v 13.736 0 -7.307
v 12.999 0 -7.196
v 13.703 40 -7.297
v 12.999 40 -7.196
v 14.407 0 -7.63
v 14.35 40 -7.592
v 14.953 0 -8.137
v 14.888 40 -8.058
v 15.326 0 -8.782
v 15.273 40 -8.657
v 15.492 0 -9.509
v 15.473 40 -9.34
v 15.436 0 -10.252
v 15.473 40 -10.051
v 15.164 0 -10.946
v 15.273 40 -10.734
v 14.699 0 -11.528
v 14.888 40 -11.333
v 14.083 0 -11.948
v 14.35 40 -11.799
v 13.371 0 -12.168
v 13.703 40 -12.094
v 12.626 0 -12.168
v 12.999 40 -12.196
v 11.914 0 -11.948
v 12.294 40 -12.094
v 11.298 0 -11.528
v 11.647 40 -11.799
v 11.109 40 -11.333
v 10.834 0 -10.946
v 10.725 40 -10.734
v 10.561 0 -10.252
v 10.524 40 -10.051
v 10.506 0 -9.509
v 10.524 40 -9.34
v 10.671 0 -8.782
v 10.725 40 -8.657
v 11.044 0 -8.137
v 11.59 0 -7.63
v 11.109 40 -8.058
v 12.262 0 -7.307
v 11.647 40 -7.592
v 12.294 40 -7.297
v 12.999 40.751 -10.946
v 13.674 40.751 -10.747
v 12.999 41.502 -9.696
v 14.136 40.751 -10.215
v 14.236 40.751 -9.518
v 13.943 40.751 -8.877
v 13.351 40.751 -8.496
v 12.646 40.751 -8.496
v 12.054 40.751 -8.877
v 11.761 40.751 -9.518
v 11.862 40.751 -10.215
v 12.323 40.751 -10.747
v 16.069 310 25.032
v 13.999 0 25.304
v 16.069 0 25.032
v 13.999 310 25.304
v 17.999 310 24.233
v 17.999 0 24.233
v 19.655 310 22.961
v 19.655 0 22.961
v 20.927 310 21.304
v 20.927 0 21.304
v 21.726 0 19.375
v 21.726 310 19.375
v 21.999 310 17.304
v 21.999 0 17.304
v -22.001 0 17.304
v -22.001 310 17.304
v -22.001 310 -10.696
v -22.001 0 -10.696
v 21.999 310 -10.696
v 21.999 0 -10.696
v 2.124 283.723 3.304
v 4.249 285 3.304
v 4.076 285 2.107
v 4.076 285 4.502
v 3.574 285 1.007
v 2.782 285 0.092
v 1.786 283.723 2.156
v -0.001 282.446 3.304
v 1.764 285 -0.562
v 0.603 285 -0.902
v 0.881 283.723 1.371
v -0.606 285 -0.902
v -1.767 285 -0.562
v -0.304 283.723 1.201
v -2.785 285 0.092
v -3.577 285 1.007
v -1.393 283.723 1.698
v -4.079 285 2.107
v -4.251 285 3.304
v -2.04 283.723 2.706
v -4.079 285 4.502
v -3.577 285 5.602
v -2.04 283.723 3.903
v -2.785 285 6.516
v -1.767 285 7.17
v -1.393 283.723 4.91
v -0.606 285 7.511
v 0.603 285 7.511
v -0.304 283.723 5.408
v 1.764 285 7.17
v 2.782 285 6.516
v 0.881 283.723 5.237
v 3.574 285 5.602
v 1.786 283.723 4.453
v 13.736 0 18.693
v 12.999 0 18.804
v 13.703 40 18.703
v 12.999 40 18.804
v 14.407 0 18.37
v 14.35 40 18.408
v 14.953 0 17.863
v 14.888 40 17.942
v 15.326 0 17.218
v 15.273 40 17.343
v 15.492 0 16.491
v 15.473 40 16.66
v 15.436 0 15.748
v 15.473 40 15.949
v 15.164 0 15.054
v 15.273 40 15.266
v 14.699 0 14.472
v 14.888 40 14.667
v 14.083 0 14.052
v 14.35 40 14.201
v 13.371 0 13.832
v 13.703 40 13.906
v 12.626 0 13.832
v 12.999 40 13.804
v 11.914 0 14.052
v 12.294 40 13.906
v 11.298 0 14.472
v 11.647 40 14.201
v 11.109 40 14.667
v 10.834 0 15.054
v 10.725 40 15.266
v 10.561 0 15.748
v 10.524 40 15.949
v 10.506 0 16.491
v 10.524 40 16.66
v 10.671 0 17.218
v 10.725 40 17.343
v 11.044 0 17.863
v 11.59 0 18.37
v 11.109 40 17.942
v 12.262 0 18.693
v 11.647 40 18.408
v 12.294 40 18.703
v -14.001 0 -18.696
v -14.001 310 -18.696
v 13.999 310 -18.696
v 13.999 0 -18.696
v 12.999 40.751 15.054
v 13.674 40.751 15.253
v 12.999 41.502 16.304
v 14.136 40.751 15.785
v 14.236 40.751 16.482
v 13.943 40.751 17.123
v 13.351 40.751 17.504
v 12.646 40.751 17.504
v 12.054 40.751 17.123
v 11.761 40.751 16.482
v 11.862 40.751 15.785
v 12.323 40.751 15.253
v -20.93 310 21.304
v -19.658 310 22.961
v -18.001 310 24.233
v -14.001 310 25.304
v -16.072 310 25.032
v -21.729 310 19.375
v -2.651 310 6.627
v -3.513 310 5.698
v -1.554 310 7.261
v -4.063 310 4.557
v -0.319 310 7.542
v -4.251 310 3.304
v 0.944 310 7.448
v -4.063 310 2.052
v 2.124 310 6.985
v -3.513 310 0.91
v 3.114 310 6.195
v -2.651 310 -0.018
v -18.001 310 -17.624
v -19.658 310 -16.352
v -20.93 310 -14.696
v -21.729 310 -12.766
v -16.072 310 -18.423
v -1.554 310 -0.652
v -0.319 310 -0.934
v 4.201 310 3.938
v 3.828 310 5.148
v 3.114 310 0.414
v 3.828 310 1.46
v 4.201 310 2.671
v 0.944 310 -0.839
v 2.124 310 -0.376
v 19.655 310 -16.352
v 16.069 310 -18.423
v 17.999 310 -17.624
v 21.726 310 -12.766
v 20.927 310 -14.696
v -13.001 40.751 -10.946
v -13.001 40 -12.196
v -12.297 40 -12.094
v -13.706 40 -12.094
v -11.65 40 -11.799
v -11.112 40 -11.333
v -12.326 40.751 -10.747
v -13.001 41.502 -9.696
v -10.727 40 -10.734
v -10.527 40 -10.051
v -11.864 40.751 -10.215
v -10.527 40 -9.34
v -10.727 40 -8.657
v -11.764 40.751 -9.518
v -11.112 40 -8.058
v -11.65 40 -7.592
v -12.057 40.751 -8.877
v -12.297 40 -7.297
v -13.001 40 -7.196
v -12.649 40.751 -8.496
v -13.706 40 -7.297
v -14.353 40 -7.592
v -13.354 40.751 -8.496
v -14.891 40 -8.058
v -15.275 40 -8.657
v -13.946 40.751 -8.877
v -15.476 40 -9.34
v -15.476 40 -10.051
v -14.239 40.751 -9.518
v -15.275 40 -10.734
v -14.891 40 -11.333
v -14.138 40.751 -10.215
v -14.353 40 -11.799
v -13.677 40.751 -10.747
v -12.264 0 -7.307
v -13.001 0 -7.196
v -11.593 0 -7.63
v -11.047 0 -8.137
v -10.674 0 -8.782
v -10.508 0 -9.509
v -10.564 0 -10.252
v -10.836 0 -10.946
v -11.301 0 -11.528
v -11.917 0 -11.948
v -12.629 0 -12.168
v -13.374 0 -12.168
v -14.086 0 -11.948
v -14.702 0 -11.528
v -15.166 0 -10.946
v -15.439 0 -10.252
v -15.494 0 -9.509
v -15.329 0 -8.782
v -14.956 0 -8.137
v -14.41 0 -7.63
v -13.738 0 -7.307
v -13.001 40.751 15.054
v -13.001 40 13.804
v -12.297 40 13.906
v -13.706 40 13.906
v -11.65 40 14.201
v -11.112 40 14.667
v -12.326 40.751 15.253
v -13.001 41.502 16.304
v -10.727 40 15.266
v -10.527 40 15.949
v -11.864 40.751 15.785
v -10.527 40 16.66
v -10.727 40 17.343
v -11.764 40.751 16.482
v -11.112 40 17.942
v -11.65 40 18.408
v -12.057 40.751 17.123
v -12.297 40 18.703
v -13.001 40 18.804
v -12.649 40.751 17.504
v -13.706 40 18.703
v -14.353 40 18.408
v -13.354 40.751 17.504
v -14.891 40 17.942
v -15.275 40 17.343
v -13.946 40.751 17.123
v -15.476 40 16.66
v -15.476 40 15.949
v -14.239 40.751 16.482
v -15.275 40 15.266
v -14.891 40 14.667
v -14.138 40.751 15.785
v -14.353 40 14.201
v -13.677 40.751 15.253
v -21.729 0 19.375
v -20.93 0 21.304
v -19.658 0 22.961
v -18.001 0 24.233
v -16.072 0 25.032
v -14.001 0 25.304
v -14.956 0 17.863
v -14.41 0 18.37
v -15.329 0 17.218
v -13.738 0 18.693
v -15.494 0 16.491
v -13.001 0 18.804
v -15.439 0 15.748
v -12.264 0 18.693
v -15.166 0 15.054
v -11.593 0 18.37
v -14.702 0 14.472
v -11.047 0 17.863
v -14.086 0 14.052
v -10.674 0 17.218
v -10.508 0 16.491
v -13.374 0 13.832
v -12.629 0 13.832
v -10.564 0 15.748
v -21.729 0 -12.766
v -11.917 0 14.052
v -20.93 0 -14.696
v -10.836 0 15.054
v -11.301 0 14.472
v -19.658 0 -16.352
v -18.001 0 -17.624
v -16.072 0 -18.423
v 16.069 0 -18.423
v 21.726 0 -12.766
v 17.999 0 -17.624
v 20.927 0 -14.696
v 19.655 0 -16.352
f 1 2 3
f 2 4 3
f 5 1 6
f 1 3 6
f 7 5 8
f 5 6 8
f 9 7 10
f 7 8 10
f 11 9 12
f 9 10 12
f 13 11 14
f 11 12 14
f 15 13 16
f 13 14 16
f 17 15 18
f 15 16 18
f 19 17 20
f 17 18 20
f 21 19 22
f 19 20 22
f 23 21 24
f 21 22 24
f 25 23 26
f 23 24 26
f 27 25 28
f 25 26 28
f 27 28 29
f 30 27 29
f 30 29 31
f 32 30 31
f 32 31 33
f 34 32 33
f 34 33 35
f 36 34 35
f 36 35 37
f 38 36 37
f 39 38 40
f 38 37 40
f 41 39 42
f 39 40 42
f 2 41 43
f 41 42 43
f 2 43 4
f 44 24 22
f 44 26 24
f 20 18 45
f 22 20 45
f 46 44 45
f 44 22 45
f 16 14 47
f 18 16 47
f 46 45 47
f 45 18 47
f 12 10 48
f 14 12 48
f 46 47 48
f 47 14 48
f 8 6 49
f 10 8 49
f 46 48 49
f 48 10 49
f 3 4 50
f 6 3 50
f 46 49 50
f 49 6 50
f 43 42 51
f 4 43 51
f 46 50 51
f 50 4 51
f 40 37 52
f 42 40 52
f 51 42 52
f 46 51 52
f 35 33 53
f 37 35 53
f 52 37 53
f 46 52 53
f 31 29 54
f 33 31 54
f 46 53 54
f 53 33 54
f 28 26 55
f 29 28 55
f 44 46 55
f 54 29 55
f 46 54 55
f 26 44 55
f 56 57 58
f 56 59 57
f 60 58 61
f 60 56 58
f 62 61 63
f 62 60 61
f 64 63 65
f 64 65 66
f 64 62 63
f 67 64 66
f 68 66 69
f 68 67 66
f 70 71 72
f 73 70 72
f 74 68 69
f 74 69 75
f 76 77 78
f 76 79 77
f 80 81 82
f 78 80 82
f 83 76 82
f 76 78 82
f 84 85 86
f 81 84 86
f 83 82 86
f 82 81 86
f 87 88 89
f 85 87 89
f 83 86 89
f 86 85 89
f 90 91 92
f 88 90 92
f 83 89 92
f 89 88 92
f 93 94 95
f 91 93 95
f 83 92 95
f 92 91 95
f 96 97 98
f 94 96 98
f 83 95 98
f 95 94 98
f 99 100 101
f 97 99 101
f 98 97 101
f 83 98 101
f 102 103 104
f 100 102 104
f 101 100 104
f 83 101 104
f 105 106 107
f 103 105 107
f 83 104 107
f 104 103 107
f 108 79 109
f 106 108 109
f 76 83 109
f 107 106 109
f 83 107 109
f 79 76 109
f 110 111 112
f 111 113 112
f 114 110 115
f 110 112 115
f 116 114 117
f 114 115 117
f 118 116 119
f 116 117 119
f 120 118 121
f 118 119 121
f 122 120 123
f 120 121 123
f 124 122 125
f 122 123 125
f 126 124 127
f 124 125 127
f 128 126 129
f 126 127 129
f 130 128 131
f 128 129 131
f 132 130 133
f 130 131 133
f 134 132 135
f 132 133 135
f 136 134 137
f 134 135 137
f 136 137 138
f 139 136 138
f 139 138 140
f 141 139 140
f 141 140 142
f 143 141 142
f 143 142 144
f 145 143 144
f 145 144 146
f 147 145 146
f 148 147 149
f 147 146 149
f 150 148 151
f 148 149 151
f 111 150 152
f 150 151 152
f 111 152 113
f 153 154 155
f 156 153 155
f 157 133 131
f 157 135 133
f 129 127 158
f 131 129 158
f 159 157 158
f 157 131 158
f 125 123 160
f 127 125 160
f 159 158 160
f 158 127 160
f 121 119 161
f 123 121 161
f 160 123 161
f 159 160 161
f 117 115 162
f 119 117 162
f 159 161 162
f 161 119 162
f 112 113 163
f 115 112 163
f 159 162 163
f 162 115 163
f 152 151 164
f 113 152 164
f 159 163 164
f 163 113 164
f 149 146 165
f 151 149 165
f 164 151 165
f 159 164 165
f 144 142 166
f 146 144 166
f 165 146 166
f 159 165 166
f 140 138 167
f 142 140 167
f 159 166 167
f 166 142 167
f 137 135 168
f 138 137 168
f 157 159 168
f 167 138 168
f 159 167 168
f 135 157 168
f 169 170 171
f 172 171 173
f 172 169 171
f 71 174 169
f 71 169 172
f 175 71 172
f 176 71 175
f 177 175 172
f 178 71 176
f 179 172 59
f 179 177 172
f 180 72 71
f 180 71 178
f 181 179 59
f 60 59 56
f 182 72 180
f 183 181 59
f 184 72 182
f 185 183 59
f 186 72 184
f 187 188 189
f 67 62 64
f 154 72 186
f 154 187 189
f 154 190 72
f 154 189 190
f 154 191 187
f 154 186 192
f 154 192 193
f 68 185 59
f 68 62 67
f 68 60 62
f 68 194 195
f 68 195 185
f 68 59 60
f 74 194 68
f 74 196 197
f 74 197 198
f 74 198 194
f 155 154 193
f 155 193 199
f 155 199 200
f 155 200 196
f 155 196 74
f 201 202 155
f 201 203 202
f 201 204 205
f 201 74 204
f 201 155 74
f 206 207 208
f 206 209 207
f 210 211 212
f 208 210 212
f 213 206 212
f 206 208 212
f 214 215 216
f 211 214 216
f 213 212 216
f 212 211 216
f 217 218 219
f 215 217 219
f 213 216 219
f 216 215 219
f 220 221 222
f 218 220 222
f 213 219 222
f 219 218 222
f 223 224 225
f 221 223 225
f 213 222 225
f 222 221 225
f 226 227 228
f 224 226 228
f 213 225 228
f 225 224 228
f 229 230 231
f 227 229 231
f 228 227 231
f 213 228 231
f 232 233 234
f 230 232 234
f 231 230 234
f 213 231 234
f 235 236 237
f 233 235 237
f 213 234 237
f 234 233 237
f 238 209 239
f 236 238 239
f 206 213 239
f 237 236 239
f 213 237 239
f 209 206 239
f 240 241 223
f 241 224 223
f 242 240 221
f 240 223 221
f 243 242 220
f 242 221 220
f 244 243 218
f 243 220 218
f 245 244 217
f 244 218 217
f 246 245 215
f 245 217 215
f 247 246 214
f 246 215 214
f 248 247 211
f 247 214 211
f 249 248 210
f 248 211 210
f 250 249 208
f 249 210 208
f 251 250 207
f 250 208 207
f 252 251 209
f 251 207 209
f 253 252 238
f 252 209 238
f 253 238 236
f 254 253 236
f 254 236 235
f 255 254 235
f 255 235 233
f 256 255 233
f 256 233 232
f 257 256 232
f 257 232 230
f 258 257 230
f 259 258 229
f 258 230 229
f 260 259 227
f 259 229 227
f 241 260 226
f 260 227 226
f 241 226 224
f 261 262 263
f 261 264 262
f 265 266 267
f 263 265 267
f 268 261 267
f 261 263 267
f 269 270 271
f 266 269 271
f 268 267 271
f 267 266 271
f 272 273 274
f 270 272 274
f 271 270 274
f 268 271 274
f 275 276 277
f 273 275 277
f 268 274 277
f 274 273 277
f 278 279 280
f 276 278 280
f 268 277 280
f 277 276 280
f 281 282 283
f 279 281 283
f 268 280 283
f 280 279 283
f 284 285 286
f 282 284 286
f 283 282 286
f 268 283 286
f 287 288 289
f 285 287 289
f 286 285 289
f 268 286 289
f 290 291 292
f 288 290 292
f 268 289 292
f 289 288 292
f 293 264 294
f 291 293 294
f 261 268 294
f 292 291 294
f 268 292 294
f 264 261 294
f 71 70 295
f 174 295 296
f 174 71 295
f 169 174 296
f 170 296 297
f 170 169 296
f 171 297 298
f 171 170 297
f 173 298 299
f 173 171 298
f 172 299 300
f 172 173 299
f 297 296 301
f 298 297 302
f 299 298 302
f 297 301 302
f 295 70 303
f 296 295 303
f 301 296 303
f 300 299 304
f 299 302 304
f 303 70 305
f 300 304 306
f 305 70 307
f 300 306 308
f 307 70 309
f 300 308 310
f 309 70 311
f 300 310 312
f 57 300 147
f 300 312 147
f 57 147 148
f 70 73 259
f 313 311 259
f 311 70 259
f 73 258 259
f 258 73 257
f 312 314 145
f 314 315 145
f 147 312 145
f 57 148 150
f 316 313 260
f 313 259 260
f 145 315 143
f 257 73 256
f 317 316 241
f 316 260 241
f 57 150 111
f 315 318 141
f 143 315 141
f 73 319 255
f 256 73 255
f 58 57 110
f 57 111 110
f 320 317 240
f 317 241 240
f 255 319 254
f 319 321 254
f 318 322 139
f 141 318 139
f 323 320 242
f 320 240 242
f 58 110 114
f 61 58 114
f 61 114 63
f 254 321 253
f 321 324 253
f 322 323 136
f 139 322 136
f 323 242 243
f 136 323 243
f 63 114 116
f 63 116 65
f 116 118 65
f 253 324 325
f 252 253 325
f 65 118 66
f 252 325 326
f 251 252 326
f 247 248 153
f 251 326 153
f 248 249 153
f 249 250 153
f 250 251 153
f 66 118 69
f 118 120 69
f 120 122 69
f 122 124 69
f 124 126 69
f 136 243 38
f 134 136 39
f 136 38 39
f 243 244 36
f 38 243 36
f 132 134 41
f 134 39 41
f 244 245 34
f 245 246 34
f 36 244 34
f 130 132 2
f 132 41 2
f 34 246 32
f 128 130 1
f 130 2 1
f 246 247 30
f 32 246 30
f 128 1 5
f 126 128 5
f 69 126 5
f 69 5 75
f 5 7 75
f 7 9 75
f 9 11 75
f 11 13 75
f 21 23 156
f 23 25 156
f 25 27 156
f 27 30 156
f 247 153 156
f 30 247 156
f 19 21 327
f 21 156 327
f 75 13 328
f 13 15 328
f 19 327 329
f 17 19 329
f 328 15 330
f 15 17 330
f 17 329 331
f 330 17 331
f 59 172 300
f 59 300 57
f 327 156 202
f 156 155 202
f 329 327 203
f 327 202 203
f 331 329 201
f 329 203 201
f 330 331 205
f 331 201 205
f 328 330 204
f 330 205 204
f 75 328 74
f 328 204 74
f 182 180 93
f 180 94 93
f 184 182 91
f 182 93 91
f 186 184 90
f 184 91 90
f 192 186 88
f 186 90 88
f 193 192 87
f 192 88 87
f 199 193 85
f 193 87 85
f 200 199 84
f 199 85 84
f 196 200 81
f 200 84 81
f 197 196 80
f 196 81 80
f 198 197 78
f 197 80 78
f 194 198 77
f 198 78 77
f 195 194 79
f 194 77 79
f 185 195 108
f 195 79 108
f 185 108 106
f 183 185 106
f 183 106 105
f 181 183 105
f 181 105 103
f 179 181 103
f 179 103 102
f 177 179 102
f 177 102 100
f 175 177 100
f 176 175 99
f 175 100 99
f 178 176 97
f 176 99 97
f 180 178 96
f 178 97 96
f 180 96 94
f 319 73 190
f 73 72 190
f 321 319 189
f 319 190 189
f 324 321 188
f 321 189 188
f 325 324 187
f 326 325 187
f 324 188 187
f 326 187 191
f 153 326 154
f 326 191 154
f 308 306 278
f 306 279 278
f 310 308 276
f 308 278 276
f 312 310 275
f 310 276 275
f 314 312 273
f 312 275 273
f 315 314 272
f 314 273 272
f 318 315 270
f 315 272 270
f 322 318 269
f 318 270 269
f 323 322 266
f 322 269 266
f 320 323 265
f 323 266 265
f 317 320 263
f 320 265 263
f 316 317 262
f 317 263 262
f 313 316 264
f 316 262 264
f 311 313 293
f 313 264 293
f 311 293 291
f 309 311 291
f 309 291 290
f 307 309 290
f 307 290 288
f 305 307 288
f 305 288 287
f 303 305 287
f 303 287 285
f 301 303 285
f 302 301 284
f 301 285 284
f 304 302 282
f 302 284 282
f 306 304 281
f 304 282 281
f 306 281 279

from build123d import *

# Parameters (mm, degrees)
SKETCH_2_W              = 44
SKETCH_2_H              = 44
EXTRUDE_1_DEPTH         = 310
HOLE_WIZARD_M10_1_D     = 8.5
HOLE_WIZARD_M10_1_DEPTH = 25
HOLE_WIZARD_M10_1_TIP   = 2.553657631
HOLE_WIZARD_M6_1_D      = 5
HOLE_WIZARD_M6_1_DEPTH  = 40
HOLE_WIZARD_M6_1_TIP    = 1.502151548
FILLET_1_R              = 8


with BuildPart() as part:
    # 草图2 → 凸台-拉伸1 (new body)
    with BuildSketch(Plane(origin=(0, 0, 0), x_dir=(1, 0, 0), z_dir=(0, 1, 0))):
        with Locations((-0.001355374, -3.30438103)):
            Rectangle(SKETCH_2_W, SKETCH_2_H)
    extrude(amount=EXTRUDE_1_DEPTH)

    # M10 螺纹孔1
    with Locations(Plane(origin=(0, 310, 0), x_dir=(1, 0, 0), z_dir=(0, 1, 0))):
        with Locations((-0.001355374, -3.30438103)):
            Hole(HOLE_WIZARD_M10_1_D / 2, depth=HOLE_WIZARD_M10_1_DEPTH)
            with Locations((0, 0, -(HOLE_WIZARD_M10_1_DEPTH + HOLE_WIZARD_M10_1_TIP / 2))):  # 118° drill point
                Cone(0, HOLE_WIZARD_M10_1_D / 2, HOLE_WIZARD_M10_1_TIP, mode=Mode.SUBTRACT)

    # M6 螺纹孔1
    with Locations(Plane(origin=(-13.001355374, 0, 16.30438103), x_dir=(0, 0, -1), z_dir=(0, -1, 0))):
        with Locations((0, 0), (0, 26), (26, 26), (26, 0)):
            Hole(HOLE_WIZARD_M6_1_D / 2, depth=HOLE_WIZARD_M6_1_DEPTH)
            with Locations((0, 0, -(HOLE_WIZARD_M6_1_DEPTH + HOLE_WIZARD_M6_1_TIP / 2))):  # 118° drill point
                Cone(0, HOLE_WIZARD_M6_1_D / 2, HOLE_WIZARD_M6_1_TIP, mode=Mode.SUBTRACT)

    # 圆角1
    fillet_1_edges = [part.edges().sort_by_distance(p)[0] for p in [
        (-22.001355374, 155, -18.69561897),
        (21.998644626, 155, -18.69561897),
        (21.998644626, 155, 25.30438103),
        (-22.001355374, 155, 25.30438103),
    ]]
    fillet(fillet_1_edges, radius=FILLET_1_R)


solid = part.part
